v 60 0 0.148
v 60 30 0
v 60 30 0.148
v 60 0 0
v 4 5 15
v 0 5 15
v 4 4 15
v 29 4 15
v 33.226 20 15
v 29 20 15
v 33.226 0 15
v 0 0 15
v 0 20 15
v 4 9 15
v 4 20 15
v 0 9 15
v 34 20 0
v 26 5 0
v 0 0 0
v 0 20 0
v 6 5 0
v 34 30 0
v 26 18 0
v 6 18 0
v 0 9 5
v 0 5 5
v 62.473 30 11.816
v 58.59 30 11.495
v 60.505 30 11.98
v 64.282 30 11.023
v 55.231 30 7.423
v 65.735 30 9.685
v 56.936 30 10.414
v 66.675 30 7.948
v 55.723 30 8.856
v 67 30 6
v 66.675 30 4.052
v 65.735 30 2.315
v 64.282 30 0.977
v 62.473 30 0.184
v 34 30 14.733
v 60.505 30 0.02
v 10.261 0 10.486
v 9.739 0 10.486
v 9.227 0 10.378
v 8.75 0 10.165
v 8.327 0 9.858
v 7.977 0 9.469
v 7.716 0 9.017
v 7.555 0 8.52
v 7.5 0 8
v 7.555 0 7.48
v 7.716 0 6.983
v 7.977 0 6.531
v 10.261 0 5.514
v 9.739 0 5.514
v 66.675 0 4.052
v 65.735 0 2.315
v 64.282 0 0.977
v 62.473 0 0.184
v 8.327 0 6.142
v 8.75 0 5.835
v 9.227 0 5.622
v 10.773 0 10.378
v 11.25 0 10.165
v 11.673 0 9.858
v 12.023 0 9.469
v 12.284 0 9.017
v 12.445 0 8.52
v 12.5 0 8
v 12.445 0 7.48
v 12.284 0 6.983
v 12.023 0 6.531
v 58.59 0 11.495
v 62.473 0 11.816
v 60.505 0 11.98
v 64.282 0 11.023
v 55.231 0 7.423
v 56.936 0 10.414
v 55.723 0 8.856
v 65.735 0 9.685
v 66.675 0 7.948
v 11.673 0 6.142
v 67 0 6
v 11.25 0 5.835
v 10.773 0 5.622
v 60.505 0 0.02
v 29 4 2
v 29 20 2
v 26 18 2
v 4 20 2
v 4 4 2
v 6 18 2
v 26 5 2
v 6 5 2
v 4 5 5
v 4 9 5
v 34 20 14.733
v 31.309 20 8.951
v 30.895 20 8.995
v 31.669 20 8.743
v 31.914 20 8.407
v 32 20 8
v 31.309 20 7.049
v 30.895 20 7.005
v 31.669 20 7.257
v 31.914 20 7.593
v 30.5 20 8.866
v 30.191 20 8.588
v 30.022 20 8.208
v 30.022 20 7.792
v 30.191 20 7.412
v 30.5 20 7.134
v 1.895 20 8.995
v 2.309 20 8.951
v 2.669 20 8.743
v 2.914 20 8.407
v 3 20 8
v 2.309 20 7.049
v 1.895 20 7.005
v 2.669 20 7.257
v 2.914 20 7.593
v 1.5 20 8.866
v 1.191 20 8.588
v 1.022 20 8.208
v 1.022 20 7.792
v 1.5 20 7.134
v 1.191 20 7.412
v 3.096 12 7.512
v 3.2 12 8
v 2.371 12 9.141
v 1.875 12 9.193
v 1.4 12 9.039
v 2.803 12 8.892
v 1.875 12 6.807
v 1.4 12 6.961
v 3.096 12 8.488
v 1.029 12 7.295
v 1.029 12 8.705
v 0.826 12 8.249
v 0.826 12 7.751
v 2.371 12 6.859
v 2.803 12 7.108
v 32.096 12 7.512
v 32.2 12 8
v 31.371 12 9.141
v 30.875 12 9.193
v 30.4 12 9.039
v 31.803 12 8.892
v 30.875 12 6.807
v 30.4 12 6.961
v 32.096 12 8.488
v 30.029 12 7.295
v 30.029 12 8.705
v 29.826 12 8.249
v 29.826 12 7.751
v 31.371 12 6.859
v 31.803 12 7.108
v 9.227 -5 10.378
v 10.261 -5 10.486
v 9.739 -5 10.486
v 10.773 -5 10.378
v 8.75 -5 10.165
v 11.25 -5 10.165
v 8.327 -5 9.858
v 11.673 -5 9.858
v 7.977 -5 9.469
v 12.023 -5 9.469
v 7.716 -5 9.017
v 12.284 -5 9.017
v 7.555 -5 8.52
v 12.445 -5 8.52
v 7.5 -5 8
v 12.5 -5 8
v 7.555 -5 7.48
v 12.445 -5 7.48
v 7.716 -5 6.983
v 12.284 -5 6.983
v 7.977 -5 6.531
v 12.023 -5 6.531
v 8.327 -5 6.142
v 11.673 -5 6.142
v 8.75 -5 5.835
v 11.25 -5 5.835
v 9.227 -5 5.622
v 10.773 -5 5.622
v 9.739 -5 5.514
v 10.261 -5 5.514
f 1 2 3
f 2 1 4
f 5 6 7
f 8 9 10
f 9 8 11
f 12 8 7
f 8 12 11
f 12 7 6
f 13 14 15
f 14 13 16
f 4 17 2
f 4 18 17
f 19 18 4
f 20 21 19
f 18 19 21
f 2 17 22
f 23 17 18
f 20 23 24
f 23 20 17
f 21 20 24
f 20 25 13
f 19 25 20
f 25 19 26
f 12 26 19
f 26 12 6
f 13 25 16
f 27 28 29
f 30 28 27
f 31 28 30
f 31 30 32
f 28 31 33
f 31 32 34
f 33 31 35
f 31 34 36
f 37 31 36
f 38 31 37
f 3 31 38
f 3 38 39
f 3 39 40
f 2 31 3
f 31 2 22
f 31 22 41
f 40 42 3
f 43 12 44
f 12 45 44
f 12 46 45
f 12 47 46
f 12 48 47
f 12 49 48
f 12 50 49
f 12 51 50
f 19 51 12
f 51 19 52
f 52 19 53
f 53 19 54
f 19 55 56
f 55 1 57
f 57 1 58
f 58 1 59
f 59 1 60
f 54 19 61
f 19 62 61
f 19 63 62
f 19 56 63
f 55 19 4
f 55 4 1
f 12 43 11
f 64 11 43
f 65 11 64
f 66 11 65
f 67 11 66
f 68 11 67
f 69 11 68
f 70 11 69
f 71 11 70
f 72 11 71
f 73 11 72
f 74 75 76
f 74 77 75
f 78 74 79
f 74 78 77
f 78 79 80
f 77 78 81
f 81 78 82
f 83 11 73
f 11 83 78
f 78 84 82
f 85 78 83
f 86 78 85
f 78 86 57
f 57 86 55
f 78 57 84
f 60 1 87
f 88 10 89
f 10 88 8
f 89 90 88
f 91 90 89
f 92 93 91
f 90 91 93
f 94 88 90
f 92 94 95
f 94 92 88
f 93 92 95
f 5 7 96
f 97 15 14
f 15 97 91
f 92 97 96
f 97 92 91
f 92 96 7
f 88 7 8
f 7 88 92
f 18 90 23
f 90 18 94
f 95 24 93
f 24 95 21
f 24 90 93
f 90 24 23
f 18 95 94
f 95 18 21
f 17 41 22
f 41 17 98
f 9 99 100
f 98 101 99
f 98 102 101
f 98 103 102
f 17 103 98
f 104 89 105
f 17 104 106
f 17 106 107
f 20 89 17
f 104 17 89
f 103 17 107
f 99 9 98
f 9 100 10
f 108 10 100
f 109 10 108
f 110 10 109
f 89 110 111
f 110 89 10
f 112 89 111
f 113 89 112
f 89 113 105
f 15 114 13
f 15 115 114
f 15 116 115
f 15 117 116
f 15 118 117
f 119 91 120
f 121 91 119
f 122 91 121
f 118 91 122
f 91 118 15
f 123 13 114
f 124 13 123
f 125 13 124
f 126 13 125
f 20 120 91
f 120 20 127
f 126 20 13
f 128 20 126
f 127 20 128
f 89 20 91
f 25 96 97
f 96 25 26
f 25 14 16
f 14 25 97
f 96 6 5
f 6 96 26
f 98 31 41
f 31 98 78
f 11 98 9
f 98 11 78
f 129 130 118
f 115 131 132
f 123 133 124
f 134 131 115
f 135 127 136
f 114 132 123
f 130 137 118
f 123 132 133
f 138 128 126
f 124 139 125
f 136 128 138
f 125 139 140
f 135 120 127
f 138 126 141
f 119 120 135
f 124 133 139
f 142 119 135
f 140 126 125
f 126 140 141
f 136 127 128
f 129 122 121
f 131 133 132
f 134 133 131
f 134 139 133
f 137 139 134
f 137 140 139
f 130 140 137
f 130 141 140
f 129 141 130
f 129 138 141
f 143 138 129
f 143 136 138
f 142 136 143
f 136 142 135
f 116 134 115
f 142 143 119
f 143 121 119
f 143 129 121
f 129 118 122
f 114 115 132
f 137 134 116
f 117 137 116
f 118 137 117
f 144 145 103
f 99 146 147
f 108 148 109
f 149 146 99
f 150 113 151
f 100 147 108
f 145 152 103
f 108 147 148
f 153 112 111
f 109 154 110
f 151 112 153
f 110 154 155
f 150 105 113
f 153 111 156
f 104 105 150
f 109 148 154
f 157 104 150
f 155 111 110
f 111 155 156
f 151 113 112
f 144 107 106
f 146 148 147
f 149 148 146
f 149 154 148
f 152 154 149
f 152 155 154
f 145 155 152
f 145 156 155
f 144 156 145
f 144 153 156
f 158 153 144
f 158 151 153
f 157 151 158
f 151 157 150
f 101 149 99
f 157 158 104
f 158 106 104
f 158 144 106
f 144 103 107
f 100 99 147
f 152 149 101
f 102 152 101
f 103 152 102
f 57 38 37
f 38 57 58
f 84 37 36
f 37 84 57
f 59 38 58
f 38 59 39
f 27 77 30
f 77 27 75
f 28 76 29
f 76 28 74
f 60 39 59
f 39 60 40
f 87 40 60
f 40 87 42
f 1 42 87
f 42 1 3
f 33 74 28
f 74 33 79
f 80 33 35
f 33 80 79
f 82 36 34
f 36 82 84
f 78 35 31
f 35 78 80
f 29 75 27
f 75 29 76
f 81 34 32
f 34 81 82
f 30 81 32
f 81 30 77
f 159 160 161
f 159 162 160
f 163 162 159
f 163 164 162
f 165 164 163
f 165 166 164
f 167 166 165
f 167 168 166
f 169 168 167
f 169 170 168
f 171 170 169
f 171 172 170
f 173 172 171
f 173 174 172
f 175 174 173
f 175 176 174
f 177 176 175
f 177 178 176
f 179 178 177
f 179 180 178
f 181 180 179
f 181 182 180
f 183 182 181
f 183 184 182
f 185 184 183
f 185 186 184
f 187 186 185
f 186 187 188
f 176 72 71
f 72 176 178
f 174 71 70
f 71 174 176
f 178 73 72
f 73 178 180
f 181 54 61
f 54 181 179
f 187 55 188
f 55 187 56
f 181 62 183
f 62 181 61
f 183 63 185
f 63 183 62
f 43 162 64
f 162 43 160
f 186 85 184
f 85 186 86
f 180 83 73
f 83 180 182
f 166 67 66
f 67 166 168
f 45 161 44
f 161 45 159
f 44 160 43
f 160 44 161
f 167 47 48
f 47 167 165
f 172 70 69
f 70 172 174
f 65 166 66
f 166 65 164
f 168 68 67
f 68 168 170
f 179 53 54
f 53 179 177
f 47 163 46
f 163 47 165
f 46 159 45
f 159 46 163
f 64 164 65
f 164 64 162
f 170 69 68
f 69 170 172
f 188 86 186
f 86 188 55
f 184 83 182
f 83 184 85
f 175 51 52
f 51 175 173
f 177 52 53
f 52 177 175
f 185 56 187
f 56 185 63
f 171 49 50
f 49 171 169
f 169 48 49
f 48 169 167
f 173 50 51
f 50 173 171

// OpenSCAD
// Oikea jalka (右)

difference(){
    // Jalka
    cube([60,30,15]);
    translate([4,4,2]) cube([25,30,15]);
    translate([6,5,-2]) cube([20,13,15]);
    // Sensoripään syvennys
    translate([28,21,2]) cube([6,11,15]);
    translate([-1,20,-1]) cube([35,11,17]);
    // Johdon aukko
    translate([-1,5,5]) cube([6,4,11]);
    
    // Tassu
    rotate([0,19,0])translate([26.5,0,25])cube([25,30,10]);
    translate([55,0,8])cube([10,30,10]);
    
    // Ruuviaukot
    rotate([-90,0,0])translate([2,-8,12])cylinder(8,1.2,1,$fn=15);
    rotate([-90,0,0])translate([31,-8,12])cylinder(8,1.2,1,$fn=15); 
    
}
// Tassu
rotate([-90,0,0])translate([61,-6,0])cylinder(30,6,6); 
// Kiinnityskohta
rotate([-90,0,0])translate([10,-8,-5])cylinder(6,2.5,2.5,$fn=30);
